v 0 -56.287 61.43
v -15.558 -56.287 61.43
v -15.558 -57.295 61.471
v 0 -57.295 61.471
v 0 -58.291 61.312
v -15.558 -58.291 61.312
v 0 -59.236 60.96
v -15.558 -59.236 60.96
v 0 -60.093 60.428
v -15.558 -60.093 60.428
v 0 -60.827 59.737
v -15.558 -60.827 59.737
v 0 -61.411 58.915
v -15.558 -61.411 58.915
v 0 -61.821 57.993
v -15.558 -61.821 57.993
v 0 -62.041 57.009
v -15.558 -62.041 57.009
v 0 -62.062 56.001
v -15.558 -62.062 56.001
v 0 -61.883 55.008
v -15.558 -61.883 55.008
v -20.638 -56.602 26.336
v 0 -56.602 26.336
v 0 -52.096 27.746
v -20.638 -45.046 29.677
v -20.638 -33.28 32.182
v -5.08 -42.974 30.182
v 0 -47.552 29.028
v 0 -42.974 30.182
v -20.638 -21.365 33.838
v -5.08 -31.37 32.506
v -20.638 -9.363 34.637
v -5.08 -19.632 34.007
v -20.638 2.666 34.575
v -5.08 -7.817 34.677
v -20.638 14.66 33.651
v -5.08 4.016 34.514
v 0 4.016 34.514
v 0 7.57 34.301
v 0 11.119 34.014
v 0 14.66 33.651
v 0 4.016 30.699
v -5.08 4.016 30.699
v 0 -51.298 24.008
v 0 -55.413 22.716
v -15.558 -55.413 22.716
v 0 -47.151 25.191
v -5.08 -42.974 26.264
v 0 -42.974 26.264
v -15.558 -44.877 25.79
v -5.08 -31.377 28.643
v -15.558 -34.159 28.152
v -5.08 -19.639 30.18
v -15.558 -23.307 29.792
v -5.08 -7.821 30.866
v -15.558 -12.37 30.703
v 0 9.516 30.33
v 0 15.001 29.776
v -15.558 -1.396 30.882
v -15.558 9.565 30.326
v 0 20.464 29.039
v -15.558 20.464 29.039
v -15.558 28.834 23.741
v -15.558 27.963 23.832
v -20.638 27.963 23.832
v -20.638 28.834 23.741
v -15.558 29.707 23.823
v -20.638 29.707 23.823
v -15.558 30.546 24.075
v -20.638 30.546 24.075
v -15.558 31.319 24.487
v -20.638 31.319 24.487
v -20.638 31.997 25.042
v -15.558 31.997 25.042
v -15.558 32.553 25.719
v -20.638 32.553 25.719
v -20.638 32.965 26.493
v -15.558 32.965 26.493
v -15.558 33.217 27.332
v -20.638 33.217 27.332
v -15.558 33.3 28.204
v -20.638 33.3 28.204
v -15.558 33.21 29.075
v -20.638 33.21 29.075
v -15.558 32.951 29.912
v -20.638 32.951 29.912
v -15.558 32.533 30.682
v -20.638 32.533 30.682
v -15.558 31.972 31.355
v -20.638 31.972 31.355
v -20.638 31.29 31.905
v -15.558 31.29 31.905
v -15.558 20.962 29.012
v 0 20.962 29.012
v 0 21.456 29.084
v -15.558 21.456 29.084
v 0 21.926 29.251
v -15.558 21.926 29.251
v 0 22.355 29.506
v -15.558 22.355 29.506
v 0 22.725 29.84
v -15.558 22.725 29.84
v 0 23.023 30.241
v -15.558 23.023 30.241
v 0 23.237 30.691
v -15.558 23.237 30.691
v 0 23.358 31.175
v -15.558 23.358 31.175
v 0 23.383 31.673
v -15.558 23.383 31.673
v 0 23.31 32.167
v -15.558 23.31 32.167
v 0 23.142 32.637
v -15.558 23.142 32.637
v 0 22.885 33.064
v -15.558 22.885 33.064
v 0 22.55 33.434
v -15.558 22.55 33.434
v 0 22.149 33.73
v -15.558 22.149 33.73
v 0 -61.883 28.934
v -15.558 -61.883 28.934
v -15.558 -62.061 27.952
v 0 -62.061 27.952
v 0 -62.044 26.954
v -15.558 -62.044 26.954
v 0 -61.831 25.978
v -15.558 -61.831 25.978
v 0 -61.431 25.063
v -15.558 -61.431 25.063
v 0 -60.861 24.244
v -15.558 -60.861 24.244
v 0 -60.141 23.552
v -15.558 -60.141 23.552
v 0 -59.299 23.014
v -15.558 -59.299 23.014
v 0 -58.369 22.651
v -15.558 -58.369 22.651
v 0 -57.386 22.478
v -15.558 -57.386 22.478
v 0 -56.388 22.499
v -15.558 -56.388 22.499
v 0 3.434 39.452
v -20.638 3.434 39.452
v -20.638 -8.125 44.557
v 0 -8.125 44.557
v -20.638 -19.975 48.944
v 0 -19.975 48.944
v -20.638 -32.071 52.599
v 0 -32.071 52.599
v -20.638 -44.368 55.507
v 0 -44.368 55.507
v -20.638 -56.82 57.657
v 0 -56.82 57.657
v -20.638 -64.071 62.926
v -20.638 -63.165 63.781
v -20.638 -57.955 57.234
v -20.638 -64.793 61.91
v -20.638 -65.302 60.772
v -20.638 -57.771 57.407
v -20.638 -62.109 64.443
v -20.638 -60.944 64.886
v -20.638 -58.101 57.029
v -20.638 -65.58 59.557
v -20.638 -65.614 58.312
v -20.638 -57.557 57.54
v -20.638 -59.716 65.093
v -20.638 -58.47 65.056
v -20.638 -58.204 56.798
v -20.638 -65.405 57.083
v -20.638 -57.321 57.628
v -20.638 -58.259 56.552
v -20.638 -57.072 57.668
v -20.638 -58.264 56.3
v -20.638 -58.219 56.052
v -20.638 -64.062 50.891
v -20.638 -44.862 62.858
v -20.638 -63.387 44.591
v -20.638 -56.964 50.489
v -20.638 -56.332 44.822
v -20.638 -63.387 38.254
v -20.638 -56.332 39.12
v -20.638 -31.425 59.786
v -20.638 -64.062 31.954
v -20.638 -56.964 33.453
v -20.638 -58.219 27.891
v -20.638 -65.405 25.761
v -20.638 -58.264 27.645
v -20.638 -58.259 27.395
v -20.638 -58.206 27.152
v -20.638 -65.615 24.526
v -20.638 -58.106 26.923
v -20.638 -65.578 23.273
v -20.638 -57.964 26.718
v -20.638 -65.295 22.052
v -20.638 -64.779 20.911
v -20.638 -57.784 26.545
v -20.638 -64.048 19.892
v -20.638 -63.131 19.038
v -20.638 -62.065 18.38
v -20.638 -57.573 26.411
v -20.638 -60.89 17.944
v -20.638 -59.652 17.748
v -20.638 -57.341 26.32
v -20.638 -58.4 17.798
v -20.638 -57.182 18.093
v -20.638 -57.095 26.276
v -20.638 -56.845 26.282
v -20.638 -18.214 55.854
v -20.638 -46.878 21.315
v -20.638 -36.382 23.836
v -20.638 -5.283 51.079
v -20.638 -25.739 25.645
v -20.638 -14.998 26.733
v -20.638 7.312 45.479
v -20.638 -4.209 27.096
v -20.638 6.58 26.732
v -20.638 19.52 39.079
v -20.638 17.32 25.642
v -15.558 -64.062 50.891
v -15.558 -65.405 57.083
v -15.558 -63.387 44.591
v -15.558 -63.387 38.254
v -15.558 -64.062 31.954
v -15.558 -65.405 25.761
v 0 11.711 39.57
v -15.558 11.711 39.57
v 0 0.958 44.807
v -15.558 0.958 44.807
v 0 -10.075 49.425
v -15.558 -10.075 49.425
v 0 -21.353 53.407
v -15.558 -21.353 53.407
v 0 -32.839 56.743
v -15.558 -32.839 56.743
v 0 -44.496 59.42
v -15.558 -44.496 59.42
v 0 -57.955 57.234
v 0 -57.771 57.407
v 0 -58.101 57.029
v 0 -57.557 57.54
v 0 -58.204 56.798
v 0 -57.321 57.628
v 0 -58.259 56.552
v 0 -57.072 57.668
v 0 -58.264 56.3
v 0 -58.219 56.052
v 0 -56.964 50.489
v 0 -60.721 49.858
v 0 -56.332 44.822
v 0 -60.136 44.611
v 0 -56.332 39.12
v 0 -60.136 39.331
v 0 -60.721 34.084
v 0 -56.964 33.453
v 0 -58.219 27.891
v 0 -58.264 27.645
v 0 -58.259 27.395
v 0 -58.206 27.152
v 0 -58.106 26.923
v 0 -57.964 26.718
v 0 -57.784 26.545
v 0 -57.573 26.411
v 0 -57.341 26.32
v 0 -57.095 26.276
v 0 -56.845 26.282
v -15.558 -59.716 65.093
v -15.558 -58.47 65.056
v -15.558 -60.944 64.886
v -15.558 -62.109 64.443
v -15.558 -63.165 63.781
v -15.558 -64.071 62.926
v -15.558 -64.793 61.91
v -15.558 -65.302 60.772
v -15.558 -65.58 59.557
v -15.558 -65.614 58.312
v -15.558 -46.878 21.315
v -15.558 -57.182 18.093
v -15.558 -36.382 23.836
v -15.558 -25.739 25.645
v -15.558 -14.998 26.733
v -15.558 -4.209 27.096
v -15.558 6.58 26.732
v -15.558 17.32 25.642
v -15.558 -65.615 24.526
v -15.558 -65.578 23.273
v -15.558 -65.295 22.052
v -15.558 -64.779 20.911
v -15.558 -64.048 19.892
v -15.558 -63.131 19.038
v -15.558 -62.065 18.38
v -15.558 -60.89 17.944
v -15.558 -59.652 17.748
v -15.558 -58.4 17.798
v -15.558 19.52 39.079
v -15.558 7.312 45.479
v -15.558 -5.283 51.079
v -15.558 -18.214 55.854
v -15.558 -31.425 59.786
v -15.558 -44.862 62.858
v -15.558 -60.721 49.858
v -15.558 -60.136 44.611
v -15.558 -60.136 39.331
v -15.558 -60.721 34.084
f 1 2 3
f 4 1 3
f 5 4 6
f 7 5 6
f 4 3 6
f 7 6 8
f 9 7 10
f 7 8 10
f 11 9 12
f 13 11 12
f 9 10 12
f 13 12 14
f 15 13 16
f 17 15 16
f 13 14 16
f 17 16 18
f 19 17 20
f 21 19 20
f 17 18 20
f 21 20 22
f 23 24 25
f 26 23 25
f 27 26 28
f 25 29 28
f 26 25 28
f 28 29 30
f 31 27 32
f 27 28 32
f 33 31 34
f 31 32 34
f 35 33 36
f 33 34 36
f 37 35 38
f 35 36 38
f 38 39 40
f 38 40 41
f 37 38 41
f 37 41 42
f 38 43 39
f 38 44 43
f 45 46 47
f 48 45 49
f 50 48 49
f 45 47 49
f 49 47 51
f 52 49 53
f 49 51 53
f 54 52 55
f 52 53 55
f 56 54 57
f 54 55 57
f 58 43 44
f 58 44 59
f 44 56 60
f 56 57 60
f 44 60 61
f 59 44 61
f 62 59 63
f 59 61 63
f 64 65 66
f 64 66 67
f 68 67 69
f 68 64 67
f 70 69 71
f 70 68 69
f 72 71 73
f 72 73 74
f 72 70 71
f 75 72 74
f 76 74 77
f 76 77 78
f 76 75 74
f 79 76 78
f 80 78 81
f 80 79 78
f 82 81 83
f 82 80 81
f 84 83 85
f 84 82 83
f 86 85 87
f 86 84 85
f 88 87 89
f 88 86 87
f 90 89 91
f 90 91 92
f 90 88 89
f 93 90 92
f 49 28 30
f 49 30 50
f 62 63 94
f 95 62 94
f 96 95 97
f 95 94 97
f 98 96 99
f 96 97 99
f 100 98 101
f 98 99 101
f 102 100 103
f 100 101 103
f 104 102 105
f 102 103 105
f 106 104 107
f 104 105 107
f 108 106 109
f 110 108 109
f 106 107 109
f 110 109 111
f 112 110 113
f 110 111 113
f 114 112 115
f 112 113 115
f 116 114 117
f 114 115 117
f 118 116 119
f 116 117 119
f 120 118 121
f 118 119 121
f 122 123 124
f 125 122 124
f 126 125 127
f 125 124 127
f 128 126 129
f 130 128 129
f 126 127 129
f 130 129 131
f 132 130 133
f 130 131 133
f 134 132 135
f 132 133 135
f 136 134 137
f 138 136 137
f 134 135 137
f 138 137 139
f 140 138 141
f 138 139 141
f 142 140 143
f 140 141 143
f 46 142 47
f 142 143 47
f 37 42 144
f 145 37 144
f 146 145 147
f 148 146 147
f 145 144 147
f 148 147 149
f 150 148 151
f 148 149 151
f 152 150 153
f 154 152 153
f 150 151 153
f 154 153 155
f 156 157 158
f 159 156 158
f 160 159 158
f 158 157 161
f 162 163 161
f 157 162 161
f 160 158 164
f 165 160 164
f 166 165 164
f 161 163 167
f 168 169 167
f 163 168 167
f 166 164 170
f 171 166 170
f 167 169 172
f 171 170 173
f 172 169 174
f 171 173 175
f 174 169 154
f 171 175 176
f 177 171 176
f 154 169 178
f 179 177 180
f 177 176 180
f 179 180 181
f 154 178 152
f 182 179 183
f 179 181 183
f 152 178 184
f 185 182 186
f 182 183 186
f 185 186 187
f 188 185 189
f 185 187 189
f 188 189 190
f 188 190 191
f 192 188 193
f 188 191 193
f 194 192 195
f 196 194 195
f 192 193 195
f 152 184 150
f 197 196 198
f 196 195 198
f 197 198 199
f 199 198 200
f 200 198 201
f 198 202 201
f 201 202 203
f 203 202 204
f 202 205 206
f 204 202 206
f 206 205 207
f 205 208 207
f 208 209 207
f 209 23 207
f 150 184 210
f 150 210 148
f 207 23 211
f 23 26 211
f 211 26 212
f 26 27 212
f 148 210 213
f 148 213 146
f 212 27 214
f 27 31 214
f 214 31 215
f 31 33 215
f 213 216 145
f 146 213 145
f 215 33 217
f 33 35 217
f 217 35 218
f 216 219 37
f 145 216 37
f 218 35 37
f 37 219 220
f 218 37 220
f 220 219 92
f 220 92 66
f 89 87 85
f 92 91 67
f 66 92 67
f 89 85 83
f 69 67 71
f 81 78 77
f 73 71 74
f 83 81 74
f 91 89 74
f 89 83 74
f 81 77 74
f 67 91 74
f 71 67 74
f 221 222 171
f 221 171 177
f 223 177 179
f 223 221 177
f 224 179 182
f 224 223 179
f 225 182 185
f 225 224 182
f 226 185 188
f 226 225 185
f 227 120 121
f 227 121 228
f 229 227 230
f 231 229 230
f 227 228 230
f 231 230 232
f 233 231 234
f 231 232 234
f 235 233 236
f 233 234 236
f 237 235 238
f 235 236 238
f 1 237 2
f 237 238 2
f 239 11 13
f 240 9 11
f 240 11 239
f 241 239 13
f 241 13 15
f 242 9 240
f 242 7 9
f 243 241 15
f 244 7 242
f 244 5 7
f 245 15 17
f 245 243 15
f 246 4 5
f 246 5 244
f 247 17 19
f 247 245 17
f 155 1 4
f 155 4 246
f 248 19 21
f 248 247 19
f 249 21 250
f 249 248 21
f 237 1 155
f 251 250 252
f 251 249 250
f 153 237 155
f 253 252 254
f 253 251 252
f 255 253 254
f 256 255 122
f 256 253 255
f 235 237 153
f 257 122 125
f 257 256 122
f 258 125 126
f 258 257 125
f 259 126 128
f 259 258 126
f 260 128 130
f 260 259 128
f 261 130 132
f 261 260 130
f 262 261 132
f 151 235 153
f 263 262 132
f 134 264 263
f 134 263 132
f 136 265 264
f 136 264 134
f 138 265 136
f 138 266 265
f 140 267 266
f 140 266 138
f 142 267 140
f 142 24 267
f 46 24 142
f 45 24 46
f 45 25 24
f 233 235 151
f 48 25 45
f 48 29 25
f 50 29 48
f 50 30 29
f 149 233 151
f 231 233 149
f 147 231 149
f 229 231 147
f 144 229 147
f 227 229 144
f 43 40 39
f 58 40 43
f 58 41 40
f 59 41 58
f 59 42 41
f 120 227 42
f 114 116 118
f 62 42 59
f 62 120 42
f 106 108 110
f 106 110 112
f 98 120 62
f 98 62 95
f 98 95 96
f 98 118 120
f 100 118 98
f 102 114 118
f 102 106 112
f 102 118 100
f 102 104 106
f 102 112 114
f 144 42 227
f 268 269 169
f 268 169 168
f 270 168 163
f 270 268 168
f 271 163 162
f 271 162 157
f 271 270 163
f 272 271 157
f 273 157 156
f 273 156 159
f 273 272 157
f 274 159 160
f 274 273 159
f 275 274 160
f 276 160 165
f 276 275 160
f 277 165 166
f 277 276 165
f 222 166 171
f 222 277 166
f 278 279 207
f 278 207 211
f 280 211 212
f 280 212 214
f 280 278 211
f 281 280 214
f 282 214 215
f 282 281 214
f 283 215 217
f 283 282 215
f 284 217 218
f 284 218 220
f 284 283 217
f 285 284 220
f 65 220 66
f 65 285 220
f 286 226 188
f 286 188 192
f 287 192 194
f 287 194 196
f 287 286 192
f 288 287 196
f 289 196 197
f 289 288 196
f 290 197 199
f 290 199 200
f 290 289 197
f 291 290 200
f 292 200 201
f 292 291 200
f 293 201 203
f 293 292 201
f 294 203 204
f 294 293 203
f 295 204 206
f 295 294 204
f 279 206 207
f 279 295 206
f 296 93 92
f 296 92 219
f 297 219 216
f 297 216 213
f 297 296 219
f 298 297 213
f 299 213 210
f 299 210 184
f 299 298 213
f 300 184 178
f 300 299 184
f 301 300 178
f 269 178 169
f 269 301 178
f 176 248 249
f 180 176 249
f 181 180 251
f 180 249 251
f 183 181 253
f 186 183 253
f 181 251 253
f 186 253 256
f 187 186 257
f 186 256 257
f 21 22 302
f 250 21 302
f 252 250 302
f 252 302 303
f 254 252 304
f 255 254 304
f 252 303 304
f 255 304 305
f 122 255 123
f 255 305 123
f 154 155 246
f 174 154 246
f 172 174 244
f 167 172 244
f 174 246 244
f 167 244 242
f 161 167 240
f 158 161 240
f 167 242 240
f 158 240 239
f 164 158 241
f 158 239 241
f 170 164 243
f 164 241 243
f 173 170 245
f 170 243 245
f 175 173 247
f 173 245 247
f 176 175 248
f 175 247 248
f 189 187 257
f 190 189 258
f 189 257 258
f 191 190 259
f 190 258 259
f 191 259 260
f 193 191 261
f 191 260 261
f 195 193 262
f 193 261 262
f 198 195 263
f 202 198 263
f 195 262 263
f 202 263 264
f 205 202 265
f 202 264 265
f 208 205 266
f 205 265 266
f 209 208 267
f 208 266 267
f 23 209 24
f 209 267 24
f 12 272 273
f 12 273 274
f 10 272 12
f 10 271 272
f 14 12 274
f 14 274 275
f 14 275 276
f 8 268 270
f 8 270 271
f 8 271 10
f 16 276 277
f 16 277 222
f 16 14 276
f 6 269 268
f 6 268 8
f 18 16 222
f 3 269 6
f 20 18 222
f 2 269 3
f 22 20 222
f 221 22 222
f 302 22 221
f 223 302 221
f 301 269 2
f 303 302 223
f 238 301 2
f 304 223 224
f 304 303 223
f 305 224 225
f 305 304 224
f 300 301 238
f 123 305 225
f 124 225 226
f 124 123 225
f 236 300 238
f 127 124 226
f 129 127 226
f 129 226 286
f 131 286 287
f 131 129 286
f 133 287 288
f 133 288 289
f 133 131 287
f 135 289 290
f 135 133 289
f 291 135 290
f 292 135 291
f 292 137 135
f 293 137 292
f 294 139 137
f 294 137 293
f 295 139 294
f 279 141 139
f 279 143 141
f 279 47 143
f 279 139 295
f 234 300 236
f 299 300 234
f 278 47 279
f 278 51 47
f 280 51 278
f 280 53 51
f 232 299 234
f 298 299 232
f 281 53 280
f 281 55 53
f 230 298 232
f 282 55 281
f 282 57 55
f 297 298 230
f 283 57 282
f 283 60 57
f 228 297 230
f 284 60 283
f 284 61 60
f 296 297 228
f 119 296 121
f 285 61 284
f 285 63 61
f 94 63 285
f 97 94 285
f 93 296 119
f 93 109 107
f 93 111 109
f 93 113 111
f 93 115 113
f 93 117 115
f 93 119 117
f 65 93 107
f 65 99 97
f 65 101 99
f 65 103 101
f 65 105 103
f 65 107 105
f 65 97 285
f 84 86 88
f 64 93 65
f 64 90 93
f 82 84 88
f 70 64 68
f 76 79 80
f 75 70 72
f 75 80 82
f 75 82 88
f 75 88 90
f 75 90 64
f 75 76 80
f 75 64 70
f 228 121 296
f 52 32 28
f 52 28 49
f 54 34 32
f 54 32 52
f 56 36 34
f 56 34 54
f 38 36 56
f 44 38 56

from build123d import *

# Parameters (mm, degrees)
BOSS_EXTRUDE1_DEPTH = 76.2
SKETCH2_W           = 6.985
SKETCH2_H           = 9.525
CUT_EXTRUDE1_DEPTH  = 119.84173867
CUT_EXTRUDE2_DEPTH  = 119.84173867
CUT_EXTRUDE3_DEPTH  = 119.84173867
FILLET1_R           = 2.54
CUT_EXTRUDE4_DEPTH  = 5.08
CUT_EXTRUDE6_DEPTH  = 15.113
FILLET2_R           = 0.508
BOSS_EXTRUDE2_DEPTH = 15.5575
BOSS_EXTRUDE3_DEPTH = 5.08
CUT_EXTRUDE7_DEPTH  = 5.08


with BuildPart() as part:
    # Sketch1 → Boss-Extrude1 (new body)
    with BuildSketch(Plane.XY):
        Polygon((-15.5575, 76.2), (15.5575, 76.2), (15.5575, -76.2), (7.845485509, -76.2), (9.525, -85.725), (-9.525, -85.725), (-7.845485509, -76.2), (-15.5575, -76.2), align=None)
    extrude(amount=BOSS_EXTRUDE1_DEPTH)

    # Sketch2 → Cut-Extrude1 (cut, through all)
    with BuildSketch(Plane(origin=(15.5575, 0, 0), x_dir=(0, 0, -1), z_dir=(1, 0, 0))):
        with Locations((-3.4925, -80.9625)):
            Rectangle(SKETCH2_W, SKETCH2_H)
    extrude(amount=-CUT_EXTRUDE1_DEPTH, mode=Mode.SUBTRACT)

    # Sketch3 → Cut-Extrude2 (cut, through all)
    with BuildSketch(Plane(origin=(15.5575, 0, 0), x_dir=(0, 0, -1), z_dir=(1, 0, 0))):
        with BuildLine():
            Line((-76.2, -85.725), (-76.2, -76.2))
            Line((-76.2, -76.2), (-76.2, 76.2))
            Line((-76.2, 76.2), (-6.541803462, 76.2))
            ThreePointArc((-6.541803462, 76.2), (-58.046669251, 2.411215556), (-76.2, -85.725))
        make_face()
        with BuildLine():
            Line((0, -76.2), (0, 67.75939176))
            ThreePointArc((0, 67.75939176), (-18.20597202, -4.22030412), (0, -76.2))
        make_face()
    extrude(amount=-CUT_EXTRUDE2_DEPTH, mode=Mode.SUBTRACT)

    # Sketch6 → Cut-Extrude3 (cut, through all)
    with BuildSketch(Plane(origin=(15.5575, 0, 0), x_dir=(0, 0, -1), z_dir=(1, 0, 0))):
        with BuildLine():
            ThreePointArc((-28.934409948, -61.883434575), (-23.879909813, -60.517759582), (-22.716254779, -55.412963136))
            ThreePointArc((-22.716254779, -55.412963136), (-30.753414225, -11.294498854), (-26.546552055, 33.352305435))
            ThreePointArc((-26.546552055, 33.352305435), (-49.181053892, -9.446405872), (-61.429710833, -56.286781256))
            ThreePointArc((-61.429710833, -56.286781256), (-59.737369376, -60.827463042), (-55.008021131, -61.883434575))
            ThreePointArc((-55.008021131, -61.883434575), (-41.971215539, -60.062859411), (-28.934409948, -61.883434575))
        make_face()
    extrude(amount=-CUT_EXTRUDE3_DEPTH, mode=Mode.SUBTRACT)

    # Fillet1
    fillet1_edges = [part.edges().sort_by_distance(p)[0] for p in [
        (0, 33.352305435, 26.546552055),
    ]]
    fillet(fillet1_edges, radius=FILLET1_R)

    # Sketch7 → Cut-Extrude4 (cut, symmetric)
    with BuildSketch(Plane(origin=(0, 0, 0), x_dir=(0, 0, -1), z_dir=(1, 0, 0))):
        with BuildLine():
            Line((-30.699128799, 4.016230293), (-17.981752538, 4.016230293))
            ThreePointArc((-17.981752538, 4.016230293), (-17.415803594, -19.667907964), (-13.161921654, -42.973769707))
            Line((-13.161921654, -42.973769707), (-26.264177108, -42.973769707))
            ThreePointArc((-26.264177108, -42.973769707), (-30.179968378, -19.639057999), (-30.699128799, 4.016230293))
        make_face()
    extrude(amount=CUT_EXTRUDE4_DEPTH, both=True, mode=Mode.SUBTRACT)

    # Sketch10 → Cut-Extrude6 (cut, symmetric)
    with BuildSketch(Plane(origin=(15.5575, 76.2, 6.541803462), x_dir=(-1, 0, 0), z_dir=(0, -0.7903999954772005, -0.6125910929401777))):
        Polygon((0, 5.170641427), (6.985, 5.170641427), (0, -3.655858573), align=None)
        Polygon((31.115, 5.170641427), (31.115, -3.655858573), (24.13, 5.170641427), align=None)
    extrude(amount=CUT_EXTRUDE6_DEPTH, both=True, mode=Mode.SUBTRACT)

    # Fillet2
    fillet2_edges = [part.edges().sort_by_distance(p)[0] for p in [
        (0, 76.2, 6.541803462),
        (-14.111333502, 74.930435776, 7.871138317),
        (14.111333502, 74.930435776, 7.871138317),
        (-15.5575, 5.090891194, 56.873019023),
        (15.5575, 5.090891194, 56.873019023),
    ]]
    fillet(fillet2_edges, radius=FILLET2_R)


with BuildPart() as body_2:
    # Sketch11 → Boss-Extrude2 (new body)
    with BuildSketch(Plane(origin=(15.5575, 0, 0), x_dir=(0, 0, -1), z_dir=(1, 0, 0))):
        with BuildLine():
            ThreePointArc((-61.429710833, -56.286781256), (-59.737369376, -60.827463042), (-55.008021131, -61.883434575))
            ThreePointArc((-55.008021131, -61.883434575), (-41.971215539, -60.062859411), (-28.934409948, -61.883434575))
            ThreePointArc((-28.934409948, -61.883434575), (-23.879909813, -60.517759582), (-22.716254779, -55.412963136))
            ThreePointArc((-22.716254779, -55.412963136), (-30.33926448, -17.846197276), (-29.038721333, 20.464124591))
            ThreePointArc((-29.038721333, 20.464124591), (-30.691356883, 23.236746406), (-33.730314595, 22.14891737))
            ThreePointArc((-33.730314595, 22.14891737), (-51.496194807, -15.685940761), (-61.429710833, -56.286781256))
        make_face()
        with BuildLine():
            ThreePointArc((-57.657212561, -56.820032407), (-57.234127197, -57.955202853), (-56.051790136, -58.219195736))
            ThreePointArc((-56.051790136, -58.219195736), (-41.971215539, -56.252859411), (-27.890640943, -58.219195736))
            ThreePointArc((-27.890640943, -58.219195736), (-26.62701591, -57.877776988), (-26.336102151, -56.601577877))
            ThreePointArc((-26.336102151, -56.601577877), (-33.838316864, -21.365349504), (-33.651053161, 14.660196264))
            ThreePointArc((-33.651053161, 14.660196264), (-48.944068981, -19.975014906), (-57.657212561, -56.820032407))
        make_face(mode=Mode.SUBTRACT)
    extrude(amount=-BOSS_EXTRUDE2_DEPTH)

    # Sketch13 → Cut-Extrude7 (cut, symmetric)
    with BuildSketch(Plane(origin=(0, 0, 0), x_dir=(0, 0, -1), z_dir=(1, 0, 0))):
        with BuildLine():
            Line((-17.981752538, 4.016230293), (-34.513828125, 4.016230293))
            ThreePointArc((-34.513828125, 4.016230293), (-34.007192205, -19.631694302), (-30.182465628, -42.973769707))
            Line((-30.182465628, -42.973769707), (-13.161921654, -42.973769707))
            ThreePointArc((-13.161921654, -42.973769707), (-17.415803594, -19.667907964), (-17.981752538, 4.016230293))
        make_face()
    extrude(amount=CUT_EXTRUDE7_DEPTH, both=True, mode=Mode.SUBTRACT)


with BuildPart() as body_3:
    # Sketch12 → Boss-Extrude3 (new body)
    with BuildSketch(Plane(origin=(15.5575, 0, 0), x_dir=(0, 0, -1), z_dir=(1, 0, 0))):
        with BuildLine():
            ThreePointArc((-23.831738773, 27.962776346), (-26.492538641, 32.964962799), (-31.905127941, 31.28996957))
            ThreePointArc((-31.905127941, 31.28996957), (-53.570754409, -11.710044351), (-65.056281593, -58.469890723))
            ThreePointArc((-65.056281593, -58.469890723), (-62.925669808, -64.071096093), (-57.083298558, -65.405152448))
            ThreePointArc((-57.083298558, -65.405152448), (-41.422387692, -63.30256815), (-25.761476826, -65.405152448))
            ThreePointArc((-25.761476826, -65.405152448), (-19.442461008, -63.610654229), (-18.093267187, -57.18182379))
            ThreePointArc((-18.093267187, -57.18182379), (-26.733177439, -14.998448579), (-23.831738773, 27.962776346))
        make_face()
        with BuildLine():
            ThreePointArc((-27.890640943, -58.219195736), (-26.62701591, -57.877776988), (-26.336102151, -56.601577877))
            ThreePointArc((-26.336102151, -56.601577877), (-33.838316864, -21.365349504), (-33.651053161, 14.660196264))
            ThreePointArc((-33.651053161, 14.660196264), (-48.944068981, -19.975014906), (-57.657212561, -56.820032407))
            ThreePointArc((-57.657212561, -56.820032407), (-57.234127197, -57.955202853), (-56.051790136, -58.219195736))
            ThreePointArc((-56.051790136, -58.219195736), (-41.971215539, -56.252859411), (-27.890640943, -58.219195736))
        make_face(mode=Mode.SUBTRACT)
    extrude(amount=BOSS_EXTRUDE3_DEPTH)


with BuildPart() as body_2_1:
    add(body_2.part)

    # Combine1: union body 3
    add(body_3.part)


with BuildPart() as body_2_2:
    # Mirror1: mirrored copy
    add(body_2_1.part.mirror(Plane(origin=(0, -71.361391395, -45.215986197), x_dir=(0, 0, 1), z_dir=(1, 0, 0))))


solid = body_2_2.part
